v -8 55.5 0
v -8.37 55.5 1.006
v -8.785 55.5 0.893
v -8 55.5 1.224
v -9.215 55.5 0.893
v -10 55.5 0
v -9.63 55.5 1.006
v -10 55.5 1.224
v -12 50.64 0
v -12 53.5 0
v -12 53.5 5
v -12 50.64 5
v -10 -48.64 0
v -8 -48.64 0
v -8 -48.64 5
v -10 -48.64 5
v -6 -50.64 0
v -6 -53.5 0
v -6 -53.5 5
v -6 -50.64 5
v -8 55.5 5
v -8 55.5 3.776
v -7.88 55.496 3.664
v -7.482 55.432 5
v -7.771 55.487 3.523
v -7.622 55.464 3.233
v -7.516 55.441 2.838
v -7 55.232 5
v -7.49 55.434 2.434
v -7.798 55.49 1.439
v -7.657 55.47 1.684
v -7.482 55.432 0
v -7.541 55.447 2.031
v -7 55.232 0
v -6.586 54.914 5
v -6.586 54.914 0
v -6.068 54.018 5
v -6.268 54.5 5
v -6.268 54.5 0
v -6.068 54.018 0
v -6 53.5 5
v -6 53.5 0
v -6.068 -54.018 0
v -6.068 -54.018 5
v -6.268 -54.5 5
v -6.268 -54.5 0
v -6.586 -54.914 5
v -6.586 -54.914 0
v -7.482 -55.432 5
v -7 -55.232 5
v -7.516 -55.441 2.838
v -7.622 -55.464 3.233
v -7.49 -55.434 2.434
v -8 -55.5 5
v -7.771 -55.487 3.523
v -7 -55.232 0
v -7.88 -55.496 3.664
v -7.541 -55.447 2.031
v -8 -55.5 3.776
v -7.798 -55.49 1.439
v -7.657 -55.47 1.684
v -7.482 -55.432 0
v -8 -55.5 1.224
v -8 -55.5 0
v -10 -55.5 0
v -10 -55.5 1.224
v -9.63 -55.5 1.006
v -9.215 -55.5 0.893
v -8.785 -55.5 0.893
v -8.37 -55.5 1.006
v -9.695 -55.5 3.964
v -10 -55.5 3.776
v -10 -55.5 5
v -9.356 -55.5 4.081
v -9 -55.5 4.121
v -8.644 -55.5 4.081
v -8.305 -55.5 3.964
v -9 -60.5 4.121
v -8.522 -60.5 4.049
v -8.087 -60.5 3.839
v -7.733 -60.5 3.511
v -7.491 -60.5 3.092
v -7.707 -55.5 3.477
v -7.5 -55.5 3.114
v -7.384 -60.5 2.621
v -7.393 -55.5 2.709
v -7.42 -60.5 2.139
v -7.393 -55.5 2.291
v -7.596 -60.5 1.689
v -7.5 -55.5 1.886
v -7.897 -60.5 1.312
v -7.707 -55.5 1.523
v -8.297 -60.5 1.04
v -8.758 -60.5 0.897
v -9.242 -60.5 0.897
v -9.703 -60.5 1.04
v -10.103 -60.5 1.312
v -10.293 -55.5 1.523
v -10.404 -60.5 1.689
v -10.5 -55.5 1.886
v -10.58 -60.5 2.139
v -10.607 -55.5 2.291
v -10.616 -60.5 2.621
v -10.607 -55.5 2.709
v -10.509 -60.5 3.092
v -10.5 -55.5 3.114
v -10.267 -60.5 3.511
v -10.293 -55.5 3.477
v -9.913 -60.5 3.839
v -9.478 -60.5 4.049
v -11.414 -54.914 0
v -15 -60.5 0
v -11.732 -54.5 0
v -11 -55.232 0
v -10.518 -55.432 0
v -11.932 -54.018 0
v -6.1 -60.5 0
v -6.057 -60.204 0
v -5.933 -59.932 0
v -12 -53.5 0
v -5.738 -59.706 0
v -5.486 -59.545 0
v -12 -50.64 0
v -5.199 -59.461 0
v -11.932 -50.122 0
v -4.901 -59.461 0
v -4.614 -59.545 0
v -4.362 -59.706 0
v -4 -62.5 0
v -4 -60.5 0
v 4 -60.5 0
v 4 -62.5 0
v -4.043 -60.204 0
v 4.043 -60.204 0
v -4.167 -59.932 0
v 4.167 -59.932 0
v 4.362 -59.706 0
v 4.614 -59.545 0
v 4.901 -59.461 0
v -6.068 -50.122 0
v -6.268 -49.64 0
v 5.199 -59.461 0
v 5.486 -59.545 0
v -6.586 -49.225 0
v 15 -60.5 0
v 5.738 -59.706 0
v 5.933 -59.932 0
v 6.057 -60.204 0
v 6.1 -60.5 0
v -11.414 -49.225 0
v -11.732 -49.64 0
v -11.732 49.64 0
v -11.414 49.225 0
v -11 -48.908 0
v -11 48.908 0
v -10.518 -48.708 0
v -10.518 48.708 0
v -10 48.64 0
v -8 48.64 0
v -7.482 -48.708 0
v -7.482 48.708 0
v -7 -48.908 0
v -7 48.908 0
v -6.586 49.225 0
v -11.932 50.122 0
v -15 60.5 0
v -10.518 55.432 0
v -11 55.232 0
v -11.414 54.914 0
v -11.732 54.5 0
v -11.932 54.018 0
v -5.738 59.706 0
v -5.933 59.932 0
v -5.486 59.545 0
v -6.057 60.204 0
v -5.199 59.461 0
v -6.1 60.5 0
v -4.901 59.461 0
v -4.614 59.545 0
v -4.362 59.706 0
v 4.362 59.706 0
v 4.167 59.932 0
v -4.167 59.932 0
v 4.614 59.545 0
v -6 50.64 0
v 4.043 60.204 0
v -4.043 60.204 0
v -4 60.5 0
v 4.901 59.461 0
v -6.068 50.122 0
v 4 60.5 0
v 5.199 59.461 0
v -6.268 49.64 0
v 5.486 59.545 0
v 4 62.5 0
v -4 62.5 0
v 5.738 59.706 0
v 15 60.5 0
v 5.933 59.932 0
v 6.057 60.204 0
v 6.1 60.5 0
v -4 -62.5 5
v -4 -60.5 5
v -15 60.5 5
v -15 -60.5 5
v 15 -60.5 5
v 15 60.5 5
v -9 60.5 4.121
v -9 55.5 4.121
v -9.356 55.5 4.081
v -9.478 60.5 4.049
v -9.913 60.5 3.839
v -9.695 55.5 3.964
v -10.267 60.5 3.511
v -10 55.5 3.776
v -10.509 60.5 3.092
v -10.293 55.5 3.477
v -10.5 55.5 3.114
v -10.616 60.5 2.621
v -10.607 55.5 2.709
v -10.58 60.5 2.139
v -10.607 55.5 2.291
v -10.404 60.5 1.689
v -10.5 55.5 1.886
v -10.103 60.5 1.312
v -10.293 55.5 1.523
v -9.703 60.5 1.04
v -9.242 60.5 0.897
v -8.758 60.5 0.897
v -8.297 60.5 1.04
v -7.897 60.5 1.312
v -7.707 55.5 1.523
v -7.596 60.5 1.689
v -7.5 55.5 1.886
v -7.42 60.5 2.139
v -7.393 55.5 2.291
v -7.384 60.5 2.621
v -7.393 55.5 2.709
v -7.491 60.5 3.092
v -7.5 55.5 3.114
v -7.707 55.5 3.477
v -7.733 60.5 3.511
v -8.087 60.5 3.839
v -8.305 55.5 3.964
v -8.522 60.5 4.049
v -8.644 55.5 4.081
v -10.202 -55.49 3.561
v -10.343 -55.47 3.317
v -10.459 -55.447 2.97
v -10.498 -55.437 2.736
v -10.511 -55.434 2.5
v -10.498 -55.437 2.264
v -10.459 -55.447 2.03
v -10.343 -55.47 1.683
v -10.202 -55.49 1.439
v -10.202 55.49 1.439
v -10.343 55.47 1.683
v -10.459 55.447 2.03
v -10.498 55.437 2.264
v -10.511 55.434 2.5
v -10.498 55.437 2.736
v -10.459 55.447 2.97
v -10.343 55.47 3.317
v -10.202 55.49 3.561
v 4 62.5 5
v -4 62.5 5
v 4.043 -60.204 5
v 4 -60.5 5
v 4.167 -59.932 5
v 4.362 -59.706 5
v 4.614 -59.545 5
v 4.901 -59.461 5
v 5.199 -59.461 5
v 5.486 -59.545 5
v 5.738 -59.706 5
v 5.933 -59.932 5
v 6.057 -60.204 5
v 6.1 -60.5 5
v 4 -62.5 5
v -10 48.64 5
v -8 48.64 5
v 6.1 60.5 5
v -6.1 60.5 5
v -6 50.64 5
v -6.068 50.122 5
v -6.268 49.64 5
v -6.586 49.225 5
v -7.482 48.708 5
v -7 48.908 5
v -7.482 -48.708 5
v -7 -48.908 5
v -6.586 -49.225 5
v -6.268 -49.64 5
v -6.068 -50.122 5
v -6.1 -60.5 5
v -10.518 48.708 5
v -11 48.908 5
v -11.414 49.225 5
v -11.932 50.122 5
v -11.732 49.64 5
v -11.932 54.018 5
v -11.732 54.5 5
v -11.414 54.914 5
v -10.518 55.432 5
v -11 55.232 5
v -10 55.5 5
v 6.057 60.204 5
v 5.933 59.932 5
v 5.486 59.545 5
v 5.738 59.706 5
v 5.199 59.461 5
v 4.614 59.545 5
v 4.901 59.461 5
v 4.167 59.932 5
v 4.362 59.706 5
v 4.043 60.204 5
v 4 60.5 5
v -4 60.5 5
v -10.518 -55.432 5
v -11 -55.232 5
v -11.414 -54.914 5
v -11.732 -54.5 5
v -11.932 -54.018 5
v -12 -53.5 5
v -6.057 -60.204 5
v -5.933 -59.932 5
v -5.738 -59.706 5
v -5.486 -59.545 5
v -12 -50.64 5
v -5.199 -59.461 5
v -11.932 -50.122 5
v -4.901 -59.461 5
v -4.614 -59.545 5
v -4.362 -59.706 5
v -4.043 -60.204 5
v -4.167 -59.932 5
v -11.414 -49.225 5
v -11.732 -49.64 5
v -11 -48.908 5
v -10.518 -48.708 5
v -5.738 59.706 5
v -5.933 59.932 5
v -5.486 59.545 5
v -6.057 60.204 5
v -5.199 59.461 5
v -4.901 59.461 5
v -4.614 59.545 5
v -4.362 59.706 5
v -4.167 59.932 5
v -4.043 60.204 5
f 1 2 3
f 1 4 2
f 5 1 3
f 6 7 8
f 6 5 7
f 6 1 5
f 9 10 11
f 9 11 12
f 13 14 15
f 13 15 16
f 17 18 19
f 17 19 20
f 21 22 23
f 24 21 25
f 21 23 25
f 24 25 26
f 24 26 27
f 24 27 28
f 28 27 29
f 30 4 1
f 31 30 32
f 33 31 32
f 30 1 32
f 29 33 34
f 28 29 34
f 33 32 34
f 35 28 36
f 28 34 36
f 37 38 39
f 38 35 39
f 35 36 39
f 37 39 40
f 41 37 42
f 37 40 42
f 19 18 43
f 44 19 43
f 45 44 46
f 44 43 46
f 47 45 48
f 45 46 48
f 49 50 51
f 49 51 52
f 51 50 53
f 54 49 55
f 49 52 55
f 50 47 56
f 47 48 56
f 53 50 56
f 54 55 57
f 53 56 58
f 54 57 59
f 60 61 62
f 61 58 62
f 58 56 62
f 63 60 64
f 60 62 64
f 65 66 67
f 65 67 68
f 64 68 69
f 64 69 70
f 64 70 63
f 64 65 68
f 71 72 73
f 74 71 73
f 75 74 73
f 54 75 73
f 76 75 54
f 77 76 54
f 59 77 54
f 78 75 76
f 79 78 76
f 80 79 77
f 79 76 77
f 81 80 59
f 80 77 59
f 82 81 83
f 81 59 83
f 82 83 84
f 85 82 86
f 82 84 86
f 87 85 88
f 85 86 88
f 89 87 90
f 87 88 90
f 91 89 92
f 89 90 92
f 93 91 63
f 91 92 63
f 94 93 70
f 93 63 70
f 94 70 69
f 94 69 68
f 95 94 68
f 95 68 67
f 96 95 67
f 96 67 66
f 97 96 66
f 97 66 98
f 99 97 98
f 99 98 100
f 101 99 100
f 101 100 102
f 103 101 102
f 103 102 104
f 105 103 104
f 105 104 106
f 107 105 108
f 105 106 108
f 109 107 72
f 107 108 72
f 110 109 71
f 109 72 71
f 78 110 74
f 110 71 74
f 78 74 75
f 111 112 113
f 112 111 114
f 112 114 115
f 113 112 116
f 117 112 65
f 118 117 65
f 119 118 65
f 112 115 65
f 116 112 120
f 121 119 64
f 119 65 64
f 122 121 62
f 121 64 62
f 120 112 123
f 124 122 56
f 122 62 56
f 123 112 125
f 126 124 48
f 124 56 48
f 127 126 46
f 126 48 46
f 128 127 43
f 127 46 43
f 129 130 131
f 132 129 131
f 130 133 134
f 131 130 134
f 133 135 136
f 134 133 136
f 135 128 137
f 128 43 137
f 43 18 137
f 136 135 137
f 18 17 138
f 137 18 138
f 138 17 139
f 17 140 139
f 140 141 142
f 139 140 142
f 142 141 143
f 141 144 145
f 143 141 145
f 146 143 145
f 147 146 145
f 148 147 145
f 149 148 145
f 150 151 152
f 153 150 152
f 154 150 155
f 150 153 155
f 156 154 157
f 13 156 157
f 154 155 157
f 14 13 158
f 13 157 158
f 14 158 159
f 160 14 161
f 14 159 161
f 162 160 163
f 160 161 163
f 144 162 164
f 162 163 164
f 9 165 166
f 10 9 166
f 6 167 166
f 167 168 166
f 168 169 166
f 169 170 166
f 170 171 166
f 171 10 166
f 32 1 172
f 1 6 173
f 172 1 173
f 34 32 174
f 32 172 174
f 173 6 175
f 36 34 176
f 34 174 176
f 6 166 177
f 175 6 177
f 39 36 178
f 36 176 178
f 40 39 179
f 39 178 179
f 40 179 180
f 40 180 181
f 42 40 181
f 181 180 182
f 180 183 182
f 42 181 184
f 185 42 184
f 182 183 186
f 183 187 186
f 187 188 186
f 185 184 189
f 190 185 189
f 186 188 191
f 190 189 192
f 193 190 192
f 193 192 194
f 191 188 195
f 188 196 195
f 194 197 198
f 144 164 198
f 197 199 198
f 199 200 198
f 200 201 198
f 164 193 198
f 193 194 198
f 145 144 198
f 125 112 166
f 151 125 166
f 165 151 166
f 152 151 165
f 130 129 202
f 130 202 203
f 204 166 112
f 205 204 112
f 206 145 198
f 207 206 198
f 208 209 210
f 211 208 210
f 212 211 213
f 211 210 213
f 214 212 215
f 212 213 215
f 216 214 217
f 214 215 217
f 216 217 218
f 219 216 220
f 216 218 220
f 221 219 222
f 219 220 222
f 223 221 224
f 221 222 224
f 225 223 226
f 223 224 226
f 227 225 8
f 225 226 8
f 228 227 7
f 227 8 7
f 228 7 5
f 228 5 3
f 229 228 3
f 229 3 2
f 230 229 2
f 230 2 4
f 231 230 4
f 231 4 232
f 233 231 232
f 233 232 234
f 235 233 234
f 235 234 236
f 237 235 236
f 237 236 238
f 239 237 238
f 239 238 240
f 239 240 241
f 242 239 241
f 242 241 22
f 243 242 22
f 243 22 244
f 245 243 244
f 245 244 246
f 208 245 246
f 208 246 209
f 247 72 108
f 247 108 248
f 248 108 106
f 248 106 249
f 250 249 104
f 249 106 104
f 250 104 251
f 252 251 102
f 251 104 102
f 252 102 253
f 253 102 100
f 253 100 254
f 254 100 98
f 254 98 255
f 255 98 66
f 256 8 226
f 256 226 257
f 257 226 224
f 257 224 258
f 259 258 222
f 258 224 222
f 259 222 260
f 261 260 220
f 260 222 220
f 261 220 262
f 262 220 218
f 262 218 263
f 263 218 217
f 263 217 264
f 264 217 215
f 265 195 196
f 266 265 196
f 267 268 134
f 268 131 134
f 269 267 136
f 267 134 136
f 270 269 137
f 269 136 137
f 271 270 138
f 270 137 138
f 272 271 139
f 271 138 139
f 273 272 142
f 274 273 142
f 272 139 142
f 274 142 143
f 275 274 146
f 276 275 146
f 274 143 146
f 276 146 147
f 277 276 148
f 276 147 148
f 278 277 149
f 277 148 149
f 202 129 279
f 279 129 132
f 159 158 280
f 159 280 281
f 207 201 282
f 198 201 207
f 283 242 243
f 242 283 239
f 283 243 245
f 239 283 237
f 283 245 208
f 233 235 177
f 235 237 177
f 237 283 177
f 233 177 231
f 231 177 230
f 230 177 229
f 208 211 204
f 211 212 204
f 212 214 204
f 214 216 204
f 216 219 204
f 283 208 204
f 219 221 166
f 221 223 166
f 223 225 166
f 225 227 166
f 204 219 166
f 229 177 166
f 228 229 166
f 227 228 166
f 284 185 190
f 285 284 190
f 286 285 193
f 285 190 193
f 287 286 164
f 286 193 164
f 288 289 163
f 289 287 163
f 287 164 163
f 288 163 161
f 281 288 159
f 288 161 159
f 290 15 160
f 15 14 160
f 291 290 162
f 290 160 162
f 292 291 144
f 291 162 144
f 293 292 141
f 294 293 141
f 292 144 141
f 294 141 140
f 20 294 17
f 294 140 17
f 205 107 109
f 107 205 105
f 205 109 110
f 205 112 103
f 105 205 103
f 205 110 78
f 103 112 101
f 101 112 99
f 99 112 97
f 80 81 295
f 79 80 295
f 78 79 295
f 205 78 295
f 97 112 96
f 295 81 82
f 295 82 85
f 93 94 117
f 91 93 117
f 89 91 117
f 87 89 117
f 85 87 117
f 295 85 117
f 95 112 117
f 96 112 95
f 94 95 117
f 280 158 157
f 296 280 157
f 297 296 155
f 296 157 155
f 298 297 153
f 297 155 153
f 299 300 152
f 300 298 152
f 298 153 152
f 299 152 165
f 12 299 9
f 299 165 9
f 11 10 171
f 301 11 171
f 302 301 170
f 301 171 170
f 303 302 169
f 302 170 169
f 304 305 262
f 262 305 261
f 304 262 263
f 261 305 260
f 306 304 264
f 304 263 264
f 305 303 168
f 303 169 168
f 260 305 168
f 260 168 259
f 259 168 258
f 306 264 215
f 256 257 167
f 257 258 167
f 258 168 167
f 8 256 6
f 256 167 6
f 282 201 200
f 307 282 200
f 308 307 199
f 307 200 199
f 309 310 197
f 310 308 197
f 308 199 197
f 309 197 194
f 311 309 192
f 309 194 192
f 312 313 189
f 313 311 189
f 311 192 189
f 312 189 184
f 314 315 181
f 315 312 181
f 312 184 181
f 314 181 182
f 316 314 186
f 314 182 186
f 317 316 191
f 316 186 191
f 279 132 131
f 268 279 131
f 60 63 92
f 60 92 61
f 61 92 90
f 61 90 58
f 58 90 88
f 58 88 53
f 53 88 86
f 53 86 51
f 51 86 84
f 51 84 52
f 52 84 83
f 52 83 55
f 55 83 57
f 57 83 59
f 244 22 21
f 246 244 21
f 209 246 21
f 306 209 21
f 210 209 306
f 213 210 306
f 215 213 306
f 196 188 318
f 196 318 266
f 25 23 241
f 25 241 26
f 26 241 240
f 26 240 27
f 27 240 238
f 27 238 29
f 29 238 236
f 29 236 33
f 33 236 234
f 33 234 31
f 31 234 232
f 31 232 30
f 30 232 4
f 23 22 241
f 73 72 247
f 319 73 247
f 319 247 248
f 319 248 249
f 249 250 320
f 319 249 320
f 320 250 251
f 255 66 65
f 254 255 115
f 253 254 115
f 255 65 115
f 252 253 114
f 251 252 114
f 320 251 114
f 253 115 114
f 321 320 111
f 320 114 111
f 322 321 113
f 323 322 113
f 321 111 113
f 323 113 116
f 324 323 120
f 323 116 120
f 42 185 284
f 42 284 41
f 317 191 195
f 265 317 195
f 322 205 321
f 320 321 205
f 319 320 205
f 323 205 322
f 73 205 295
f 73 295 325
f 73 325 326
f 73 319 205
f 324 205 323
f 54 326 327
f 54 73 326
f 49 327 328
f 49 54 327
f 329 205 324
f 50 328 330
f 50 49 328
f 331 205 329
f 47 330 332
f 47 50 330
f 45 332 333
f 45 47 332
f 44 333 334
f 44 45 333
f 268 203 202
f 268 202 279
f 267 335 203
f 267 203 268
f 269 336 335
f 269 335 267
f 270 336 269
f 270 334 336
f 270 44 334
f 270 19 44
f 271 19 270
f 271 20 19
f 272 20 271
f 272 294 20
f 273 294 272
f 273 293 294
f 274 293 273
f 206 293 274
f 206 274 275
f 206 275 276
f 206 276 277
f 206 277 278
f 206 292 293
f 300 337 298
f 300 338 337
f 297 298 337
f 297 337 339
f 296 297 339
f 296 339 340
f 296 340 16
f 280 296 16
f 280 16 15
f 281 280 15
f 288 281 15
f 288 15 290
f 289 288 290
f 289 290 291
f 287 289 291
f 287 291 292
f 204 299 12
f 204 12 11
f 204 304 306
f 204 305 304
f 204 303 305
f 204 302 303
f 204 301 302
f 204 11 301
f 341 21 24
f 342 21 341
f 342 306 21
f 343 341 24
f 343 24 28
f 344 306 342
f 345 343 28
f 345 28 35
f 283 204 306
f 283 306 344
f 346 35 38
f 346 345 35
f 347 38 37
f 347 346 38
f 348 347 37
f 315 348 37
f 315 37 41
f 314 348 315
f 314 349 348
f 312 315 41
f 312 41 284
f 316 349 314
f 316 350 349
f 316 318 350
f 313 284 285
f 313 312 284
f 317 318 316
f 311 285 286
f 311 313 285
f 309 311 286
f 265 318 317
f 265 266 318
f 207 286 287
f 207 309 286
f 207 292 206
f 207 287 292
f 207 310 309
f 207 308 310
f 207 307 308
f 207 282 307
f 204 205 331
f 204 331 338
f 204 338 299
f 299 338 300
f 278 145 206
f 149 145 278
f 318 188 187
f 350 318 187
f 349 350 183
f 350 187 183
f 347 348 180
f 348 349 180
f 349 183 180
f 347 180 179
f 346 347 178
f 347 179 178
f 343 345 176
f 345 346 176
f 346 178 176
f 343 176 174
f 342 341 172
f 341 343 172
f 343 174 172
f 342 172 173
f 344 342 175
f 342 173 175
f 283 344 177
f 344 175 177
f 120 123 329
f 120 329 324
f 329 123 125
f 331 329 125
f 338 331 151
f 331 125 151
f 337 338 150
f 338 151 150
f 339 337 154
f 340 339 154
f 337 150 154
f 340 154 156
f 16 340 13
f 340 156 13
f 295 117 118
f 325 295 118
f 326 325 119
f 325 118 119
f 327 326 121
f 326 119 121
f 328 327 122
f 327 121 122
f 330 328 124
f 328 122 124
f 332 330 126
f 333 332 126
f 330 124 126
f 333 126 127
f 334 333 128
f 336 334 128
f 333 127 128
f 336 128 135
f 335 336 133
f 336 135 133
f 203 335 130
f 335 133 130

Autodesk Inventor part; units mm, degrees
ref_plane "YZ Plane" through (0, 0, 0) normal (1, 0, 0) x (0, 1, 0)
ref_plane "XZ Plane" through (0, 0, 0) normal (0, 1, 0) x (-1, 0, 0)
ref_plane "XY Plane" through (0, 0, 0) normal (0, 0, 1) x (1, 0, 0)
sketch "スケッチ1" plane through (0, 0, 0) normal (0, 0, 1) x (1, 0, 0)
  line L0 (15, 60.5) -> (-15, 60.5) construction
  line L1 (-15, 60.5) -> (-15, -60.5)
  line L2 (-15, -60.5) -> (15, -60.5)
  line L3 (15, -60.5) -> (15, 60.5)
  line L4 (15, 60.5) -> (-15, -60.5) construction
  line L5 (-15, 60.5) -> (15, -60.5) construction
  line L6 (4, 60.5) -> (4, 62.5)
  line L7 (4, 62.5) -> (-4, 62.5)
  arc A0 (4, 60.5) -> (6.1, 60.5) centre (5.05, 60.5) ccw
  line L8 (0, 62.5) -> (0, 60.5) construction
  line L9 (-4, 60.5) -> (-4, 62.5)
  arc A1 (-6.1, 60.5) -> (-4, 60.5) centre (-5.05, 60.5) ccw
  line L10 (0, 60.5) -> (0, -60.5) construction
  line L11 (15, 0) -> (-15, 0)
  line L12 (-9, 60.5) -> (-9, 55.5) construction
  line L13 (-11, 60.5) -> (-11, 55.5) construction
  line L14 (-7, 60.5) -> (-7, 55.5) construction
  line L15 (11.6254, -55.5) -> (-12, -55.5) construction
  line L16 (-12, -55.5) -> (-12, 55.5) construction
  line L17 (-12, 55.5) -> (11.6254, 55.5) construction
  line L18 (11.6254, 55.5) -> (11.6254, -55.5) construction
  line L19 (11.6254, -55.5) -> (-12, 55.5) construction
  line L20 (-12, -55.5) -> (11.6254, 55.5) construction
  line L21 (-8, 55.5) -> (-10, 55.5)
  line L22 (-12, 53.5) -> (-12, 50.6397)
  line L23 (-10, 48.6397) -> (-8, 48.6397)
  line L24 (-6, 50.6397) -> (-6, 53.5)
  line L25 (-6, 55.5) -> (-12, 48.6397) construction
  line L26 (-12, 55.5) -> (-6, 48.6397) construction
  arc A2 (-6, 53.5) -> (-8, 55.5) centre (-8, 53.5) ccw
  arc A3 (-10, 55.5) -> (-12, 53.5) centre (-10, 53.5) ccw
  arc A4 (-12, 50.6397) -> (-10, 48.6397) centre (-10, 50.6397) ccw
  arc A5 (-8, 48.6397) -> (-6, 50.6397) centre (-8, 50.6397) ccw
  line L27 (6.1, 60.5) -> (15, 60.5)
  line L28 (-6.1, 60.5) -> (-15, 60.5)
  point P0 (0, 0)
  point P1 (-0.1873, 0)
  point P2 (-9, 52.0698)
  point P3 (-9, 52.0698)
  dimension "d0" = 30
  dimension "d1" = 121
  dimension "d2" = 1.05
  dimension "d3" = 2
  dimension "d4" = 0
  dimension "d5" = 8
  dimension "d6" = 5
  dimension "d7" = 3
  dimension "d8" = 4
  dimension "d9" = 9
  dimension "d10" = 2
extrude "押し出し1" add sketch "スケッチ1" along normal blind 5 contours L28 A1 L9 L7 L6 A0 L27 L3 L11 L1
sketch "スケッチ2" plane through (-15, 60.5, 0) normal (0, 1, 0) x (1, 0, 0)
  line L0 (0, 0) -> (0, -5) projected
  line L1 (0, -2.5) -> (30, -2.5)
  line L2 (30, 0) -> (30, -5) projected
  line L3 (15, 0) -> (15, -5)
  line L4 (19, -5) -> (11, -5) projected
  point P0 (6, -2.5)
  dimension "d13" = 9
hole "穴1" at (-9, 60.5, 2.5) direction (0, -1, 0) diameter 3.242 depth 5 tip angle 118 thread size "M4x0.7" class "6H" standard "ISO Metric profile"
mirror "ミラー1" about plane through (-15, 0, 0) normal (0, -1, 0)
properties part number "Trunk_back_waisit_frame_" material "アセタール樹脂、黒"
